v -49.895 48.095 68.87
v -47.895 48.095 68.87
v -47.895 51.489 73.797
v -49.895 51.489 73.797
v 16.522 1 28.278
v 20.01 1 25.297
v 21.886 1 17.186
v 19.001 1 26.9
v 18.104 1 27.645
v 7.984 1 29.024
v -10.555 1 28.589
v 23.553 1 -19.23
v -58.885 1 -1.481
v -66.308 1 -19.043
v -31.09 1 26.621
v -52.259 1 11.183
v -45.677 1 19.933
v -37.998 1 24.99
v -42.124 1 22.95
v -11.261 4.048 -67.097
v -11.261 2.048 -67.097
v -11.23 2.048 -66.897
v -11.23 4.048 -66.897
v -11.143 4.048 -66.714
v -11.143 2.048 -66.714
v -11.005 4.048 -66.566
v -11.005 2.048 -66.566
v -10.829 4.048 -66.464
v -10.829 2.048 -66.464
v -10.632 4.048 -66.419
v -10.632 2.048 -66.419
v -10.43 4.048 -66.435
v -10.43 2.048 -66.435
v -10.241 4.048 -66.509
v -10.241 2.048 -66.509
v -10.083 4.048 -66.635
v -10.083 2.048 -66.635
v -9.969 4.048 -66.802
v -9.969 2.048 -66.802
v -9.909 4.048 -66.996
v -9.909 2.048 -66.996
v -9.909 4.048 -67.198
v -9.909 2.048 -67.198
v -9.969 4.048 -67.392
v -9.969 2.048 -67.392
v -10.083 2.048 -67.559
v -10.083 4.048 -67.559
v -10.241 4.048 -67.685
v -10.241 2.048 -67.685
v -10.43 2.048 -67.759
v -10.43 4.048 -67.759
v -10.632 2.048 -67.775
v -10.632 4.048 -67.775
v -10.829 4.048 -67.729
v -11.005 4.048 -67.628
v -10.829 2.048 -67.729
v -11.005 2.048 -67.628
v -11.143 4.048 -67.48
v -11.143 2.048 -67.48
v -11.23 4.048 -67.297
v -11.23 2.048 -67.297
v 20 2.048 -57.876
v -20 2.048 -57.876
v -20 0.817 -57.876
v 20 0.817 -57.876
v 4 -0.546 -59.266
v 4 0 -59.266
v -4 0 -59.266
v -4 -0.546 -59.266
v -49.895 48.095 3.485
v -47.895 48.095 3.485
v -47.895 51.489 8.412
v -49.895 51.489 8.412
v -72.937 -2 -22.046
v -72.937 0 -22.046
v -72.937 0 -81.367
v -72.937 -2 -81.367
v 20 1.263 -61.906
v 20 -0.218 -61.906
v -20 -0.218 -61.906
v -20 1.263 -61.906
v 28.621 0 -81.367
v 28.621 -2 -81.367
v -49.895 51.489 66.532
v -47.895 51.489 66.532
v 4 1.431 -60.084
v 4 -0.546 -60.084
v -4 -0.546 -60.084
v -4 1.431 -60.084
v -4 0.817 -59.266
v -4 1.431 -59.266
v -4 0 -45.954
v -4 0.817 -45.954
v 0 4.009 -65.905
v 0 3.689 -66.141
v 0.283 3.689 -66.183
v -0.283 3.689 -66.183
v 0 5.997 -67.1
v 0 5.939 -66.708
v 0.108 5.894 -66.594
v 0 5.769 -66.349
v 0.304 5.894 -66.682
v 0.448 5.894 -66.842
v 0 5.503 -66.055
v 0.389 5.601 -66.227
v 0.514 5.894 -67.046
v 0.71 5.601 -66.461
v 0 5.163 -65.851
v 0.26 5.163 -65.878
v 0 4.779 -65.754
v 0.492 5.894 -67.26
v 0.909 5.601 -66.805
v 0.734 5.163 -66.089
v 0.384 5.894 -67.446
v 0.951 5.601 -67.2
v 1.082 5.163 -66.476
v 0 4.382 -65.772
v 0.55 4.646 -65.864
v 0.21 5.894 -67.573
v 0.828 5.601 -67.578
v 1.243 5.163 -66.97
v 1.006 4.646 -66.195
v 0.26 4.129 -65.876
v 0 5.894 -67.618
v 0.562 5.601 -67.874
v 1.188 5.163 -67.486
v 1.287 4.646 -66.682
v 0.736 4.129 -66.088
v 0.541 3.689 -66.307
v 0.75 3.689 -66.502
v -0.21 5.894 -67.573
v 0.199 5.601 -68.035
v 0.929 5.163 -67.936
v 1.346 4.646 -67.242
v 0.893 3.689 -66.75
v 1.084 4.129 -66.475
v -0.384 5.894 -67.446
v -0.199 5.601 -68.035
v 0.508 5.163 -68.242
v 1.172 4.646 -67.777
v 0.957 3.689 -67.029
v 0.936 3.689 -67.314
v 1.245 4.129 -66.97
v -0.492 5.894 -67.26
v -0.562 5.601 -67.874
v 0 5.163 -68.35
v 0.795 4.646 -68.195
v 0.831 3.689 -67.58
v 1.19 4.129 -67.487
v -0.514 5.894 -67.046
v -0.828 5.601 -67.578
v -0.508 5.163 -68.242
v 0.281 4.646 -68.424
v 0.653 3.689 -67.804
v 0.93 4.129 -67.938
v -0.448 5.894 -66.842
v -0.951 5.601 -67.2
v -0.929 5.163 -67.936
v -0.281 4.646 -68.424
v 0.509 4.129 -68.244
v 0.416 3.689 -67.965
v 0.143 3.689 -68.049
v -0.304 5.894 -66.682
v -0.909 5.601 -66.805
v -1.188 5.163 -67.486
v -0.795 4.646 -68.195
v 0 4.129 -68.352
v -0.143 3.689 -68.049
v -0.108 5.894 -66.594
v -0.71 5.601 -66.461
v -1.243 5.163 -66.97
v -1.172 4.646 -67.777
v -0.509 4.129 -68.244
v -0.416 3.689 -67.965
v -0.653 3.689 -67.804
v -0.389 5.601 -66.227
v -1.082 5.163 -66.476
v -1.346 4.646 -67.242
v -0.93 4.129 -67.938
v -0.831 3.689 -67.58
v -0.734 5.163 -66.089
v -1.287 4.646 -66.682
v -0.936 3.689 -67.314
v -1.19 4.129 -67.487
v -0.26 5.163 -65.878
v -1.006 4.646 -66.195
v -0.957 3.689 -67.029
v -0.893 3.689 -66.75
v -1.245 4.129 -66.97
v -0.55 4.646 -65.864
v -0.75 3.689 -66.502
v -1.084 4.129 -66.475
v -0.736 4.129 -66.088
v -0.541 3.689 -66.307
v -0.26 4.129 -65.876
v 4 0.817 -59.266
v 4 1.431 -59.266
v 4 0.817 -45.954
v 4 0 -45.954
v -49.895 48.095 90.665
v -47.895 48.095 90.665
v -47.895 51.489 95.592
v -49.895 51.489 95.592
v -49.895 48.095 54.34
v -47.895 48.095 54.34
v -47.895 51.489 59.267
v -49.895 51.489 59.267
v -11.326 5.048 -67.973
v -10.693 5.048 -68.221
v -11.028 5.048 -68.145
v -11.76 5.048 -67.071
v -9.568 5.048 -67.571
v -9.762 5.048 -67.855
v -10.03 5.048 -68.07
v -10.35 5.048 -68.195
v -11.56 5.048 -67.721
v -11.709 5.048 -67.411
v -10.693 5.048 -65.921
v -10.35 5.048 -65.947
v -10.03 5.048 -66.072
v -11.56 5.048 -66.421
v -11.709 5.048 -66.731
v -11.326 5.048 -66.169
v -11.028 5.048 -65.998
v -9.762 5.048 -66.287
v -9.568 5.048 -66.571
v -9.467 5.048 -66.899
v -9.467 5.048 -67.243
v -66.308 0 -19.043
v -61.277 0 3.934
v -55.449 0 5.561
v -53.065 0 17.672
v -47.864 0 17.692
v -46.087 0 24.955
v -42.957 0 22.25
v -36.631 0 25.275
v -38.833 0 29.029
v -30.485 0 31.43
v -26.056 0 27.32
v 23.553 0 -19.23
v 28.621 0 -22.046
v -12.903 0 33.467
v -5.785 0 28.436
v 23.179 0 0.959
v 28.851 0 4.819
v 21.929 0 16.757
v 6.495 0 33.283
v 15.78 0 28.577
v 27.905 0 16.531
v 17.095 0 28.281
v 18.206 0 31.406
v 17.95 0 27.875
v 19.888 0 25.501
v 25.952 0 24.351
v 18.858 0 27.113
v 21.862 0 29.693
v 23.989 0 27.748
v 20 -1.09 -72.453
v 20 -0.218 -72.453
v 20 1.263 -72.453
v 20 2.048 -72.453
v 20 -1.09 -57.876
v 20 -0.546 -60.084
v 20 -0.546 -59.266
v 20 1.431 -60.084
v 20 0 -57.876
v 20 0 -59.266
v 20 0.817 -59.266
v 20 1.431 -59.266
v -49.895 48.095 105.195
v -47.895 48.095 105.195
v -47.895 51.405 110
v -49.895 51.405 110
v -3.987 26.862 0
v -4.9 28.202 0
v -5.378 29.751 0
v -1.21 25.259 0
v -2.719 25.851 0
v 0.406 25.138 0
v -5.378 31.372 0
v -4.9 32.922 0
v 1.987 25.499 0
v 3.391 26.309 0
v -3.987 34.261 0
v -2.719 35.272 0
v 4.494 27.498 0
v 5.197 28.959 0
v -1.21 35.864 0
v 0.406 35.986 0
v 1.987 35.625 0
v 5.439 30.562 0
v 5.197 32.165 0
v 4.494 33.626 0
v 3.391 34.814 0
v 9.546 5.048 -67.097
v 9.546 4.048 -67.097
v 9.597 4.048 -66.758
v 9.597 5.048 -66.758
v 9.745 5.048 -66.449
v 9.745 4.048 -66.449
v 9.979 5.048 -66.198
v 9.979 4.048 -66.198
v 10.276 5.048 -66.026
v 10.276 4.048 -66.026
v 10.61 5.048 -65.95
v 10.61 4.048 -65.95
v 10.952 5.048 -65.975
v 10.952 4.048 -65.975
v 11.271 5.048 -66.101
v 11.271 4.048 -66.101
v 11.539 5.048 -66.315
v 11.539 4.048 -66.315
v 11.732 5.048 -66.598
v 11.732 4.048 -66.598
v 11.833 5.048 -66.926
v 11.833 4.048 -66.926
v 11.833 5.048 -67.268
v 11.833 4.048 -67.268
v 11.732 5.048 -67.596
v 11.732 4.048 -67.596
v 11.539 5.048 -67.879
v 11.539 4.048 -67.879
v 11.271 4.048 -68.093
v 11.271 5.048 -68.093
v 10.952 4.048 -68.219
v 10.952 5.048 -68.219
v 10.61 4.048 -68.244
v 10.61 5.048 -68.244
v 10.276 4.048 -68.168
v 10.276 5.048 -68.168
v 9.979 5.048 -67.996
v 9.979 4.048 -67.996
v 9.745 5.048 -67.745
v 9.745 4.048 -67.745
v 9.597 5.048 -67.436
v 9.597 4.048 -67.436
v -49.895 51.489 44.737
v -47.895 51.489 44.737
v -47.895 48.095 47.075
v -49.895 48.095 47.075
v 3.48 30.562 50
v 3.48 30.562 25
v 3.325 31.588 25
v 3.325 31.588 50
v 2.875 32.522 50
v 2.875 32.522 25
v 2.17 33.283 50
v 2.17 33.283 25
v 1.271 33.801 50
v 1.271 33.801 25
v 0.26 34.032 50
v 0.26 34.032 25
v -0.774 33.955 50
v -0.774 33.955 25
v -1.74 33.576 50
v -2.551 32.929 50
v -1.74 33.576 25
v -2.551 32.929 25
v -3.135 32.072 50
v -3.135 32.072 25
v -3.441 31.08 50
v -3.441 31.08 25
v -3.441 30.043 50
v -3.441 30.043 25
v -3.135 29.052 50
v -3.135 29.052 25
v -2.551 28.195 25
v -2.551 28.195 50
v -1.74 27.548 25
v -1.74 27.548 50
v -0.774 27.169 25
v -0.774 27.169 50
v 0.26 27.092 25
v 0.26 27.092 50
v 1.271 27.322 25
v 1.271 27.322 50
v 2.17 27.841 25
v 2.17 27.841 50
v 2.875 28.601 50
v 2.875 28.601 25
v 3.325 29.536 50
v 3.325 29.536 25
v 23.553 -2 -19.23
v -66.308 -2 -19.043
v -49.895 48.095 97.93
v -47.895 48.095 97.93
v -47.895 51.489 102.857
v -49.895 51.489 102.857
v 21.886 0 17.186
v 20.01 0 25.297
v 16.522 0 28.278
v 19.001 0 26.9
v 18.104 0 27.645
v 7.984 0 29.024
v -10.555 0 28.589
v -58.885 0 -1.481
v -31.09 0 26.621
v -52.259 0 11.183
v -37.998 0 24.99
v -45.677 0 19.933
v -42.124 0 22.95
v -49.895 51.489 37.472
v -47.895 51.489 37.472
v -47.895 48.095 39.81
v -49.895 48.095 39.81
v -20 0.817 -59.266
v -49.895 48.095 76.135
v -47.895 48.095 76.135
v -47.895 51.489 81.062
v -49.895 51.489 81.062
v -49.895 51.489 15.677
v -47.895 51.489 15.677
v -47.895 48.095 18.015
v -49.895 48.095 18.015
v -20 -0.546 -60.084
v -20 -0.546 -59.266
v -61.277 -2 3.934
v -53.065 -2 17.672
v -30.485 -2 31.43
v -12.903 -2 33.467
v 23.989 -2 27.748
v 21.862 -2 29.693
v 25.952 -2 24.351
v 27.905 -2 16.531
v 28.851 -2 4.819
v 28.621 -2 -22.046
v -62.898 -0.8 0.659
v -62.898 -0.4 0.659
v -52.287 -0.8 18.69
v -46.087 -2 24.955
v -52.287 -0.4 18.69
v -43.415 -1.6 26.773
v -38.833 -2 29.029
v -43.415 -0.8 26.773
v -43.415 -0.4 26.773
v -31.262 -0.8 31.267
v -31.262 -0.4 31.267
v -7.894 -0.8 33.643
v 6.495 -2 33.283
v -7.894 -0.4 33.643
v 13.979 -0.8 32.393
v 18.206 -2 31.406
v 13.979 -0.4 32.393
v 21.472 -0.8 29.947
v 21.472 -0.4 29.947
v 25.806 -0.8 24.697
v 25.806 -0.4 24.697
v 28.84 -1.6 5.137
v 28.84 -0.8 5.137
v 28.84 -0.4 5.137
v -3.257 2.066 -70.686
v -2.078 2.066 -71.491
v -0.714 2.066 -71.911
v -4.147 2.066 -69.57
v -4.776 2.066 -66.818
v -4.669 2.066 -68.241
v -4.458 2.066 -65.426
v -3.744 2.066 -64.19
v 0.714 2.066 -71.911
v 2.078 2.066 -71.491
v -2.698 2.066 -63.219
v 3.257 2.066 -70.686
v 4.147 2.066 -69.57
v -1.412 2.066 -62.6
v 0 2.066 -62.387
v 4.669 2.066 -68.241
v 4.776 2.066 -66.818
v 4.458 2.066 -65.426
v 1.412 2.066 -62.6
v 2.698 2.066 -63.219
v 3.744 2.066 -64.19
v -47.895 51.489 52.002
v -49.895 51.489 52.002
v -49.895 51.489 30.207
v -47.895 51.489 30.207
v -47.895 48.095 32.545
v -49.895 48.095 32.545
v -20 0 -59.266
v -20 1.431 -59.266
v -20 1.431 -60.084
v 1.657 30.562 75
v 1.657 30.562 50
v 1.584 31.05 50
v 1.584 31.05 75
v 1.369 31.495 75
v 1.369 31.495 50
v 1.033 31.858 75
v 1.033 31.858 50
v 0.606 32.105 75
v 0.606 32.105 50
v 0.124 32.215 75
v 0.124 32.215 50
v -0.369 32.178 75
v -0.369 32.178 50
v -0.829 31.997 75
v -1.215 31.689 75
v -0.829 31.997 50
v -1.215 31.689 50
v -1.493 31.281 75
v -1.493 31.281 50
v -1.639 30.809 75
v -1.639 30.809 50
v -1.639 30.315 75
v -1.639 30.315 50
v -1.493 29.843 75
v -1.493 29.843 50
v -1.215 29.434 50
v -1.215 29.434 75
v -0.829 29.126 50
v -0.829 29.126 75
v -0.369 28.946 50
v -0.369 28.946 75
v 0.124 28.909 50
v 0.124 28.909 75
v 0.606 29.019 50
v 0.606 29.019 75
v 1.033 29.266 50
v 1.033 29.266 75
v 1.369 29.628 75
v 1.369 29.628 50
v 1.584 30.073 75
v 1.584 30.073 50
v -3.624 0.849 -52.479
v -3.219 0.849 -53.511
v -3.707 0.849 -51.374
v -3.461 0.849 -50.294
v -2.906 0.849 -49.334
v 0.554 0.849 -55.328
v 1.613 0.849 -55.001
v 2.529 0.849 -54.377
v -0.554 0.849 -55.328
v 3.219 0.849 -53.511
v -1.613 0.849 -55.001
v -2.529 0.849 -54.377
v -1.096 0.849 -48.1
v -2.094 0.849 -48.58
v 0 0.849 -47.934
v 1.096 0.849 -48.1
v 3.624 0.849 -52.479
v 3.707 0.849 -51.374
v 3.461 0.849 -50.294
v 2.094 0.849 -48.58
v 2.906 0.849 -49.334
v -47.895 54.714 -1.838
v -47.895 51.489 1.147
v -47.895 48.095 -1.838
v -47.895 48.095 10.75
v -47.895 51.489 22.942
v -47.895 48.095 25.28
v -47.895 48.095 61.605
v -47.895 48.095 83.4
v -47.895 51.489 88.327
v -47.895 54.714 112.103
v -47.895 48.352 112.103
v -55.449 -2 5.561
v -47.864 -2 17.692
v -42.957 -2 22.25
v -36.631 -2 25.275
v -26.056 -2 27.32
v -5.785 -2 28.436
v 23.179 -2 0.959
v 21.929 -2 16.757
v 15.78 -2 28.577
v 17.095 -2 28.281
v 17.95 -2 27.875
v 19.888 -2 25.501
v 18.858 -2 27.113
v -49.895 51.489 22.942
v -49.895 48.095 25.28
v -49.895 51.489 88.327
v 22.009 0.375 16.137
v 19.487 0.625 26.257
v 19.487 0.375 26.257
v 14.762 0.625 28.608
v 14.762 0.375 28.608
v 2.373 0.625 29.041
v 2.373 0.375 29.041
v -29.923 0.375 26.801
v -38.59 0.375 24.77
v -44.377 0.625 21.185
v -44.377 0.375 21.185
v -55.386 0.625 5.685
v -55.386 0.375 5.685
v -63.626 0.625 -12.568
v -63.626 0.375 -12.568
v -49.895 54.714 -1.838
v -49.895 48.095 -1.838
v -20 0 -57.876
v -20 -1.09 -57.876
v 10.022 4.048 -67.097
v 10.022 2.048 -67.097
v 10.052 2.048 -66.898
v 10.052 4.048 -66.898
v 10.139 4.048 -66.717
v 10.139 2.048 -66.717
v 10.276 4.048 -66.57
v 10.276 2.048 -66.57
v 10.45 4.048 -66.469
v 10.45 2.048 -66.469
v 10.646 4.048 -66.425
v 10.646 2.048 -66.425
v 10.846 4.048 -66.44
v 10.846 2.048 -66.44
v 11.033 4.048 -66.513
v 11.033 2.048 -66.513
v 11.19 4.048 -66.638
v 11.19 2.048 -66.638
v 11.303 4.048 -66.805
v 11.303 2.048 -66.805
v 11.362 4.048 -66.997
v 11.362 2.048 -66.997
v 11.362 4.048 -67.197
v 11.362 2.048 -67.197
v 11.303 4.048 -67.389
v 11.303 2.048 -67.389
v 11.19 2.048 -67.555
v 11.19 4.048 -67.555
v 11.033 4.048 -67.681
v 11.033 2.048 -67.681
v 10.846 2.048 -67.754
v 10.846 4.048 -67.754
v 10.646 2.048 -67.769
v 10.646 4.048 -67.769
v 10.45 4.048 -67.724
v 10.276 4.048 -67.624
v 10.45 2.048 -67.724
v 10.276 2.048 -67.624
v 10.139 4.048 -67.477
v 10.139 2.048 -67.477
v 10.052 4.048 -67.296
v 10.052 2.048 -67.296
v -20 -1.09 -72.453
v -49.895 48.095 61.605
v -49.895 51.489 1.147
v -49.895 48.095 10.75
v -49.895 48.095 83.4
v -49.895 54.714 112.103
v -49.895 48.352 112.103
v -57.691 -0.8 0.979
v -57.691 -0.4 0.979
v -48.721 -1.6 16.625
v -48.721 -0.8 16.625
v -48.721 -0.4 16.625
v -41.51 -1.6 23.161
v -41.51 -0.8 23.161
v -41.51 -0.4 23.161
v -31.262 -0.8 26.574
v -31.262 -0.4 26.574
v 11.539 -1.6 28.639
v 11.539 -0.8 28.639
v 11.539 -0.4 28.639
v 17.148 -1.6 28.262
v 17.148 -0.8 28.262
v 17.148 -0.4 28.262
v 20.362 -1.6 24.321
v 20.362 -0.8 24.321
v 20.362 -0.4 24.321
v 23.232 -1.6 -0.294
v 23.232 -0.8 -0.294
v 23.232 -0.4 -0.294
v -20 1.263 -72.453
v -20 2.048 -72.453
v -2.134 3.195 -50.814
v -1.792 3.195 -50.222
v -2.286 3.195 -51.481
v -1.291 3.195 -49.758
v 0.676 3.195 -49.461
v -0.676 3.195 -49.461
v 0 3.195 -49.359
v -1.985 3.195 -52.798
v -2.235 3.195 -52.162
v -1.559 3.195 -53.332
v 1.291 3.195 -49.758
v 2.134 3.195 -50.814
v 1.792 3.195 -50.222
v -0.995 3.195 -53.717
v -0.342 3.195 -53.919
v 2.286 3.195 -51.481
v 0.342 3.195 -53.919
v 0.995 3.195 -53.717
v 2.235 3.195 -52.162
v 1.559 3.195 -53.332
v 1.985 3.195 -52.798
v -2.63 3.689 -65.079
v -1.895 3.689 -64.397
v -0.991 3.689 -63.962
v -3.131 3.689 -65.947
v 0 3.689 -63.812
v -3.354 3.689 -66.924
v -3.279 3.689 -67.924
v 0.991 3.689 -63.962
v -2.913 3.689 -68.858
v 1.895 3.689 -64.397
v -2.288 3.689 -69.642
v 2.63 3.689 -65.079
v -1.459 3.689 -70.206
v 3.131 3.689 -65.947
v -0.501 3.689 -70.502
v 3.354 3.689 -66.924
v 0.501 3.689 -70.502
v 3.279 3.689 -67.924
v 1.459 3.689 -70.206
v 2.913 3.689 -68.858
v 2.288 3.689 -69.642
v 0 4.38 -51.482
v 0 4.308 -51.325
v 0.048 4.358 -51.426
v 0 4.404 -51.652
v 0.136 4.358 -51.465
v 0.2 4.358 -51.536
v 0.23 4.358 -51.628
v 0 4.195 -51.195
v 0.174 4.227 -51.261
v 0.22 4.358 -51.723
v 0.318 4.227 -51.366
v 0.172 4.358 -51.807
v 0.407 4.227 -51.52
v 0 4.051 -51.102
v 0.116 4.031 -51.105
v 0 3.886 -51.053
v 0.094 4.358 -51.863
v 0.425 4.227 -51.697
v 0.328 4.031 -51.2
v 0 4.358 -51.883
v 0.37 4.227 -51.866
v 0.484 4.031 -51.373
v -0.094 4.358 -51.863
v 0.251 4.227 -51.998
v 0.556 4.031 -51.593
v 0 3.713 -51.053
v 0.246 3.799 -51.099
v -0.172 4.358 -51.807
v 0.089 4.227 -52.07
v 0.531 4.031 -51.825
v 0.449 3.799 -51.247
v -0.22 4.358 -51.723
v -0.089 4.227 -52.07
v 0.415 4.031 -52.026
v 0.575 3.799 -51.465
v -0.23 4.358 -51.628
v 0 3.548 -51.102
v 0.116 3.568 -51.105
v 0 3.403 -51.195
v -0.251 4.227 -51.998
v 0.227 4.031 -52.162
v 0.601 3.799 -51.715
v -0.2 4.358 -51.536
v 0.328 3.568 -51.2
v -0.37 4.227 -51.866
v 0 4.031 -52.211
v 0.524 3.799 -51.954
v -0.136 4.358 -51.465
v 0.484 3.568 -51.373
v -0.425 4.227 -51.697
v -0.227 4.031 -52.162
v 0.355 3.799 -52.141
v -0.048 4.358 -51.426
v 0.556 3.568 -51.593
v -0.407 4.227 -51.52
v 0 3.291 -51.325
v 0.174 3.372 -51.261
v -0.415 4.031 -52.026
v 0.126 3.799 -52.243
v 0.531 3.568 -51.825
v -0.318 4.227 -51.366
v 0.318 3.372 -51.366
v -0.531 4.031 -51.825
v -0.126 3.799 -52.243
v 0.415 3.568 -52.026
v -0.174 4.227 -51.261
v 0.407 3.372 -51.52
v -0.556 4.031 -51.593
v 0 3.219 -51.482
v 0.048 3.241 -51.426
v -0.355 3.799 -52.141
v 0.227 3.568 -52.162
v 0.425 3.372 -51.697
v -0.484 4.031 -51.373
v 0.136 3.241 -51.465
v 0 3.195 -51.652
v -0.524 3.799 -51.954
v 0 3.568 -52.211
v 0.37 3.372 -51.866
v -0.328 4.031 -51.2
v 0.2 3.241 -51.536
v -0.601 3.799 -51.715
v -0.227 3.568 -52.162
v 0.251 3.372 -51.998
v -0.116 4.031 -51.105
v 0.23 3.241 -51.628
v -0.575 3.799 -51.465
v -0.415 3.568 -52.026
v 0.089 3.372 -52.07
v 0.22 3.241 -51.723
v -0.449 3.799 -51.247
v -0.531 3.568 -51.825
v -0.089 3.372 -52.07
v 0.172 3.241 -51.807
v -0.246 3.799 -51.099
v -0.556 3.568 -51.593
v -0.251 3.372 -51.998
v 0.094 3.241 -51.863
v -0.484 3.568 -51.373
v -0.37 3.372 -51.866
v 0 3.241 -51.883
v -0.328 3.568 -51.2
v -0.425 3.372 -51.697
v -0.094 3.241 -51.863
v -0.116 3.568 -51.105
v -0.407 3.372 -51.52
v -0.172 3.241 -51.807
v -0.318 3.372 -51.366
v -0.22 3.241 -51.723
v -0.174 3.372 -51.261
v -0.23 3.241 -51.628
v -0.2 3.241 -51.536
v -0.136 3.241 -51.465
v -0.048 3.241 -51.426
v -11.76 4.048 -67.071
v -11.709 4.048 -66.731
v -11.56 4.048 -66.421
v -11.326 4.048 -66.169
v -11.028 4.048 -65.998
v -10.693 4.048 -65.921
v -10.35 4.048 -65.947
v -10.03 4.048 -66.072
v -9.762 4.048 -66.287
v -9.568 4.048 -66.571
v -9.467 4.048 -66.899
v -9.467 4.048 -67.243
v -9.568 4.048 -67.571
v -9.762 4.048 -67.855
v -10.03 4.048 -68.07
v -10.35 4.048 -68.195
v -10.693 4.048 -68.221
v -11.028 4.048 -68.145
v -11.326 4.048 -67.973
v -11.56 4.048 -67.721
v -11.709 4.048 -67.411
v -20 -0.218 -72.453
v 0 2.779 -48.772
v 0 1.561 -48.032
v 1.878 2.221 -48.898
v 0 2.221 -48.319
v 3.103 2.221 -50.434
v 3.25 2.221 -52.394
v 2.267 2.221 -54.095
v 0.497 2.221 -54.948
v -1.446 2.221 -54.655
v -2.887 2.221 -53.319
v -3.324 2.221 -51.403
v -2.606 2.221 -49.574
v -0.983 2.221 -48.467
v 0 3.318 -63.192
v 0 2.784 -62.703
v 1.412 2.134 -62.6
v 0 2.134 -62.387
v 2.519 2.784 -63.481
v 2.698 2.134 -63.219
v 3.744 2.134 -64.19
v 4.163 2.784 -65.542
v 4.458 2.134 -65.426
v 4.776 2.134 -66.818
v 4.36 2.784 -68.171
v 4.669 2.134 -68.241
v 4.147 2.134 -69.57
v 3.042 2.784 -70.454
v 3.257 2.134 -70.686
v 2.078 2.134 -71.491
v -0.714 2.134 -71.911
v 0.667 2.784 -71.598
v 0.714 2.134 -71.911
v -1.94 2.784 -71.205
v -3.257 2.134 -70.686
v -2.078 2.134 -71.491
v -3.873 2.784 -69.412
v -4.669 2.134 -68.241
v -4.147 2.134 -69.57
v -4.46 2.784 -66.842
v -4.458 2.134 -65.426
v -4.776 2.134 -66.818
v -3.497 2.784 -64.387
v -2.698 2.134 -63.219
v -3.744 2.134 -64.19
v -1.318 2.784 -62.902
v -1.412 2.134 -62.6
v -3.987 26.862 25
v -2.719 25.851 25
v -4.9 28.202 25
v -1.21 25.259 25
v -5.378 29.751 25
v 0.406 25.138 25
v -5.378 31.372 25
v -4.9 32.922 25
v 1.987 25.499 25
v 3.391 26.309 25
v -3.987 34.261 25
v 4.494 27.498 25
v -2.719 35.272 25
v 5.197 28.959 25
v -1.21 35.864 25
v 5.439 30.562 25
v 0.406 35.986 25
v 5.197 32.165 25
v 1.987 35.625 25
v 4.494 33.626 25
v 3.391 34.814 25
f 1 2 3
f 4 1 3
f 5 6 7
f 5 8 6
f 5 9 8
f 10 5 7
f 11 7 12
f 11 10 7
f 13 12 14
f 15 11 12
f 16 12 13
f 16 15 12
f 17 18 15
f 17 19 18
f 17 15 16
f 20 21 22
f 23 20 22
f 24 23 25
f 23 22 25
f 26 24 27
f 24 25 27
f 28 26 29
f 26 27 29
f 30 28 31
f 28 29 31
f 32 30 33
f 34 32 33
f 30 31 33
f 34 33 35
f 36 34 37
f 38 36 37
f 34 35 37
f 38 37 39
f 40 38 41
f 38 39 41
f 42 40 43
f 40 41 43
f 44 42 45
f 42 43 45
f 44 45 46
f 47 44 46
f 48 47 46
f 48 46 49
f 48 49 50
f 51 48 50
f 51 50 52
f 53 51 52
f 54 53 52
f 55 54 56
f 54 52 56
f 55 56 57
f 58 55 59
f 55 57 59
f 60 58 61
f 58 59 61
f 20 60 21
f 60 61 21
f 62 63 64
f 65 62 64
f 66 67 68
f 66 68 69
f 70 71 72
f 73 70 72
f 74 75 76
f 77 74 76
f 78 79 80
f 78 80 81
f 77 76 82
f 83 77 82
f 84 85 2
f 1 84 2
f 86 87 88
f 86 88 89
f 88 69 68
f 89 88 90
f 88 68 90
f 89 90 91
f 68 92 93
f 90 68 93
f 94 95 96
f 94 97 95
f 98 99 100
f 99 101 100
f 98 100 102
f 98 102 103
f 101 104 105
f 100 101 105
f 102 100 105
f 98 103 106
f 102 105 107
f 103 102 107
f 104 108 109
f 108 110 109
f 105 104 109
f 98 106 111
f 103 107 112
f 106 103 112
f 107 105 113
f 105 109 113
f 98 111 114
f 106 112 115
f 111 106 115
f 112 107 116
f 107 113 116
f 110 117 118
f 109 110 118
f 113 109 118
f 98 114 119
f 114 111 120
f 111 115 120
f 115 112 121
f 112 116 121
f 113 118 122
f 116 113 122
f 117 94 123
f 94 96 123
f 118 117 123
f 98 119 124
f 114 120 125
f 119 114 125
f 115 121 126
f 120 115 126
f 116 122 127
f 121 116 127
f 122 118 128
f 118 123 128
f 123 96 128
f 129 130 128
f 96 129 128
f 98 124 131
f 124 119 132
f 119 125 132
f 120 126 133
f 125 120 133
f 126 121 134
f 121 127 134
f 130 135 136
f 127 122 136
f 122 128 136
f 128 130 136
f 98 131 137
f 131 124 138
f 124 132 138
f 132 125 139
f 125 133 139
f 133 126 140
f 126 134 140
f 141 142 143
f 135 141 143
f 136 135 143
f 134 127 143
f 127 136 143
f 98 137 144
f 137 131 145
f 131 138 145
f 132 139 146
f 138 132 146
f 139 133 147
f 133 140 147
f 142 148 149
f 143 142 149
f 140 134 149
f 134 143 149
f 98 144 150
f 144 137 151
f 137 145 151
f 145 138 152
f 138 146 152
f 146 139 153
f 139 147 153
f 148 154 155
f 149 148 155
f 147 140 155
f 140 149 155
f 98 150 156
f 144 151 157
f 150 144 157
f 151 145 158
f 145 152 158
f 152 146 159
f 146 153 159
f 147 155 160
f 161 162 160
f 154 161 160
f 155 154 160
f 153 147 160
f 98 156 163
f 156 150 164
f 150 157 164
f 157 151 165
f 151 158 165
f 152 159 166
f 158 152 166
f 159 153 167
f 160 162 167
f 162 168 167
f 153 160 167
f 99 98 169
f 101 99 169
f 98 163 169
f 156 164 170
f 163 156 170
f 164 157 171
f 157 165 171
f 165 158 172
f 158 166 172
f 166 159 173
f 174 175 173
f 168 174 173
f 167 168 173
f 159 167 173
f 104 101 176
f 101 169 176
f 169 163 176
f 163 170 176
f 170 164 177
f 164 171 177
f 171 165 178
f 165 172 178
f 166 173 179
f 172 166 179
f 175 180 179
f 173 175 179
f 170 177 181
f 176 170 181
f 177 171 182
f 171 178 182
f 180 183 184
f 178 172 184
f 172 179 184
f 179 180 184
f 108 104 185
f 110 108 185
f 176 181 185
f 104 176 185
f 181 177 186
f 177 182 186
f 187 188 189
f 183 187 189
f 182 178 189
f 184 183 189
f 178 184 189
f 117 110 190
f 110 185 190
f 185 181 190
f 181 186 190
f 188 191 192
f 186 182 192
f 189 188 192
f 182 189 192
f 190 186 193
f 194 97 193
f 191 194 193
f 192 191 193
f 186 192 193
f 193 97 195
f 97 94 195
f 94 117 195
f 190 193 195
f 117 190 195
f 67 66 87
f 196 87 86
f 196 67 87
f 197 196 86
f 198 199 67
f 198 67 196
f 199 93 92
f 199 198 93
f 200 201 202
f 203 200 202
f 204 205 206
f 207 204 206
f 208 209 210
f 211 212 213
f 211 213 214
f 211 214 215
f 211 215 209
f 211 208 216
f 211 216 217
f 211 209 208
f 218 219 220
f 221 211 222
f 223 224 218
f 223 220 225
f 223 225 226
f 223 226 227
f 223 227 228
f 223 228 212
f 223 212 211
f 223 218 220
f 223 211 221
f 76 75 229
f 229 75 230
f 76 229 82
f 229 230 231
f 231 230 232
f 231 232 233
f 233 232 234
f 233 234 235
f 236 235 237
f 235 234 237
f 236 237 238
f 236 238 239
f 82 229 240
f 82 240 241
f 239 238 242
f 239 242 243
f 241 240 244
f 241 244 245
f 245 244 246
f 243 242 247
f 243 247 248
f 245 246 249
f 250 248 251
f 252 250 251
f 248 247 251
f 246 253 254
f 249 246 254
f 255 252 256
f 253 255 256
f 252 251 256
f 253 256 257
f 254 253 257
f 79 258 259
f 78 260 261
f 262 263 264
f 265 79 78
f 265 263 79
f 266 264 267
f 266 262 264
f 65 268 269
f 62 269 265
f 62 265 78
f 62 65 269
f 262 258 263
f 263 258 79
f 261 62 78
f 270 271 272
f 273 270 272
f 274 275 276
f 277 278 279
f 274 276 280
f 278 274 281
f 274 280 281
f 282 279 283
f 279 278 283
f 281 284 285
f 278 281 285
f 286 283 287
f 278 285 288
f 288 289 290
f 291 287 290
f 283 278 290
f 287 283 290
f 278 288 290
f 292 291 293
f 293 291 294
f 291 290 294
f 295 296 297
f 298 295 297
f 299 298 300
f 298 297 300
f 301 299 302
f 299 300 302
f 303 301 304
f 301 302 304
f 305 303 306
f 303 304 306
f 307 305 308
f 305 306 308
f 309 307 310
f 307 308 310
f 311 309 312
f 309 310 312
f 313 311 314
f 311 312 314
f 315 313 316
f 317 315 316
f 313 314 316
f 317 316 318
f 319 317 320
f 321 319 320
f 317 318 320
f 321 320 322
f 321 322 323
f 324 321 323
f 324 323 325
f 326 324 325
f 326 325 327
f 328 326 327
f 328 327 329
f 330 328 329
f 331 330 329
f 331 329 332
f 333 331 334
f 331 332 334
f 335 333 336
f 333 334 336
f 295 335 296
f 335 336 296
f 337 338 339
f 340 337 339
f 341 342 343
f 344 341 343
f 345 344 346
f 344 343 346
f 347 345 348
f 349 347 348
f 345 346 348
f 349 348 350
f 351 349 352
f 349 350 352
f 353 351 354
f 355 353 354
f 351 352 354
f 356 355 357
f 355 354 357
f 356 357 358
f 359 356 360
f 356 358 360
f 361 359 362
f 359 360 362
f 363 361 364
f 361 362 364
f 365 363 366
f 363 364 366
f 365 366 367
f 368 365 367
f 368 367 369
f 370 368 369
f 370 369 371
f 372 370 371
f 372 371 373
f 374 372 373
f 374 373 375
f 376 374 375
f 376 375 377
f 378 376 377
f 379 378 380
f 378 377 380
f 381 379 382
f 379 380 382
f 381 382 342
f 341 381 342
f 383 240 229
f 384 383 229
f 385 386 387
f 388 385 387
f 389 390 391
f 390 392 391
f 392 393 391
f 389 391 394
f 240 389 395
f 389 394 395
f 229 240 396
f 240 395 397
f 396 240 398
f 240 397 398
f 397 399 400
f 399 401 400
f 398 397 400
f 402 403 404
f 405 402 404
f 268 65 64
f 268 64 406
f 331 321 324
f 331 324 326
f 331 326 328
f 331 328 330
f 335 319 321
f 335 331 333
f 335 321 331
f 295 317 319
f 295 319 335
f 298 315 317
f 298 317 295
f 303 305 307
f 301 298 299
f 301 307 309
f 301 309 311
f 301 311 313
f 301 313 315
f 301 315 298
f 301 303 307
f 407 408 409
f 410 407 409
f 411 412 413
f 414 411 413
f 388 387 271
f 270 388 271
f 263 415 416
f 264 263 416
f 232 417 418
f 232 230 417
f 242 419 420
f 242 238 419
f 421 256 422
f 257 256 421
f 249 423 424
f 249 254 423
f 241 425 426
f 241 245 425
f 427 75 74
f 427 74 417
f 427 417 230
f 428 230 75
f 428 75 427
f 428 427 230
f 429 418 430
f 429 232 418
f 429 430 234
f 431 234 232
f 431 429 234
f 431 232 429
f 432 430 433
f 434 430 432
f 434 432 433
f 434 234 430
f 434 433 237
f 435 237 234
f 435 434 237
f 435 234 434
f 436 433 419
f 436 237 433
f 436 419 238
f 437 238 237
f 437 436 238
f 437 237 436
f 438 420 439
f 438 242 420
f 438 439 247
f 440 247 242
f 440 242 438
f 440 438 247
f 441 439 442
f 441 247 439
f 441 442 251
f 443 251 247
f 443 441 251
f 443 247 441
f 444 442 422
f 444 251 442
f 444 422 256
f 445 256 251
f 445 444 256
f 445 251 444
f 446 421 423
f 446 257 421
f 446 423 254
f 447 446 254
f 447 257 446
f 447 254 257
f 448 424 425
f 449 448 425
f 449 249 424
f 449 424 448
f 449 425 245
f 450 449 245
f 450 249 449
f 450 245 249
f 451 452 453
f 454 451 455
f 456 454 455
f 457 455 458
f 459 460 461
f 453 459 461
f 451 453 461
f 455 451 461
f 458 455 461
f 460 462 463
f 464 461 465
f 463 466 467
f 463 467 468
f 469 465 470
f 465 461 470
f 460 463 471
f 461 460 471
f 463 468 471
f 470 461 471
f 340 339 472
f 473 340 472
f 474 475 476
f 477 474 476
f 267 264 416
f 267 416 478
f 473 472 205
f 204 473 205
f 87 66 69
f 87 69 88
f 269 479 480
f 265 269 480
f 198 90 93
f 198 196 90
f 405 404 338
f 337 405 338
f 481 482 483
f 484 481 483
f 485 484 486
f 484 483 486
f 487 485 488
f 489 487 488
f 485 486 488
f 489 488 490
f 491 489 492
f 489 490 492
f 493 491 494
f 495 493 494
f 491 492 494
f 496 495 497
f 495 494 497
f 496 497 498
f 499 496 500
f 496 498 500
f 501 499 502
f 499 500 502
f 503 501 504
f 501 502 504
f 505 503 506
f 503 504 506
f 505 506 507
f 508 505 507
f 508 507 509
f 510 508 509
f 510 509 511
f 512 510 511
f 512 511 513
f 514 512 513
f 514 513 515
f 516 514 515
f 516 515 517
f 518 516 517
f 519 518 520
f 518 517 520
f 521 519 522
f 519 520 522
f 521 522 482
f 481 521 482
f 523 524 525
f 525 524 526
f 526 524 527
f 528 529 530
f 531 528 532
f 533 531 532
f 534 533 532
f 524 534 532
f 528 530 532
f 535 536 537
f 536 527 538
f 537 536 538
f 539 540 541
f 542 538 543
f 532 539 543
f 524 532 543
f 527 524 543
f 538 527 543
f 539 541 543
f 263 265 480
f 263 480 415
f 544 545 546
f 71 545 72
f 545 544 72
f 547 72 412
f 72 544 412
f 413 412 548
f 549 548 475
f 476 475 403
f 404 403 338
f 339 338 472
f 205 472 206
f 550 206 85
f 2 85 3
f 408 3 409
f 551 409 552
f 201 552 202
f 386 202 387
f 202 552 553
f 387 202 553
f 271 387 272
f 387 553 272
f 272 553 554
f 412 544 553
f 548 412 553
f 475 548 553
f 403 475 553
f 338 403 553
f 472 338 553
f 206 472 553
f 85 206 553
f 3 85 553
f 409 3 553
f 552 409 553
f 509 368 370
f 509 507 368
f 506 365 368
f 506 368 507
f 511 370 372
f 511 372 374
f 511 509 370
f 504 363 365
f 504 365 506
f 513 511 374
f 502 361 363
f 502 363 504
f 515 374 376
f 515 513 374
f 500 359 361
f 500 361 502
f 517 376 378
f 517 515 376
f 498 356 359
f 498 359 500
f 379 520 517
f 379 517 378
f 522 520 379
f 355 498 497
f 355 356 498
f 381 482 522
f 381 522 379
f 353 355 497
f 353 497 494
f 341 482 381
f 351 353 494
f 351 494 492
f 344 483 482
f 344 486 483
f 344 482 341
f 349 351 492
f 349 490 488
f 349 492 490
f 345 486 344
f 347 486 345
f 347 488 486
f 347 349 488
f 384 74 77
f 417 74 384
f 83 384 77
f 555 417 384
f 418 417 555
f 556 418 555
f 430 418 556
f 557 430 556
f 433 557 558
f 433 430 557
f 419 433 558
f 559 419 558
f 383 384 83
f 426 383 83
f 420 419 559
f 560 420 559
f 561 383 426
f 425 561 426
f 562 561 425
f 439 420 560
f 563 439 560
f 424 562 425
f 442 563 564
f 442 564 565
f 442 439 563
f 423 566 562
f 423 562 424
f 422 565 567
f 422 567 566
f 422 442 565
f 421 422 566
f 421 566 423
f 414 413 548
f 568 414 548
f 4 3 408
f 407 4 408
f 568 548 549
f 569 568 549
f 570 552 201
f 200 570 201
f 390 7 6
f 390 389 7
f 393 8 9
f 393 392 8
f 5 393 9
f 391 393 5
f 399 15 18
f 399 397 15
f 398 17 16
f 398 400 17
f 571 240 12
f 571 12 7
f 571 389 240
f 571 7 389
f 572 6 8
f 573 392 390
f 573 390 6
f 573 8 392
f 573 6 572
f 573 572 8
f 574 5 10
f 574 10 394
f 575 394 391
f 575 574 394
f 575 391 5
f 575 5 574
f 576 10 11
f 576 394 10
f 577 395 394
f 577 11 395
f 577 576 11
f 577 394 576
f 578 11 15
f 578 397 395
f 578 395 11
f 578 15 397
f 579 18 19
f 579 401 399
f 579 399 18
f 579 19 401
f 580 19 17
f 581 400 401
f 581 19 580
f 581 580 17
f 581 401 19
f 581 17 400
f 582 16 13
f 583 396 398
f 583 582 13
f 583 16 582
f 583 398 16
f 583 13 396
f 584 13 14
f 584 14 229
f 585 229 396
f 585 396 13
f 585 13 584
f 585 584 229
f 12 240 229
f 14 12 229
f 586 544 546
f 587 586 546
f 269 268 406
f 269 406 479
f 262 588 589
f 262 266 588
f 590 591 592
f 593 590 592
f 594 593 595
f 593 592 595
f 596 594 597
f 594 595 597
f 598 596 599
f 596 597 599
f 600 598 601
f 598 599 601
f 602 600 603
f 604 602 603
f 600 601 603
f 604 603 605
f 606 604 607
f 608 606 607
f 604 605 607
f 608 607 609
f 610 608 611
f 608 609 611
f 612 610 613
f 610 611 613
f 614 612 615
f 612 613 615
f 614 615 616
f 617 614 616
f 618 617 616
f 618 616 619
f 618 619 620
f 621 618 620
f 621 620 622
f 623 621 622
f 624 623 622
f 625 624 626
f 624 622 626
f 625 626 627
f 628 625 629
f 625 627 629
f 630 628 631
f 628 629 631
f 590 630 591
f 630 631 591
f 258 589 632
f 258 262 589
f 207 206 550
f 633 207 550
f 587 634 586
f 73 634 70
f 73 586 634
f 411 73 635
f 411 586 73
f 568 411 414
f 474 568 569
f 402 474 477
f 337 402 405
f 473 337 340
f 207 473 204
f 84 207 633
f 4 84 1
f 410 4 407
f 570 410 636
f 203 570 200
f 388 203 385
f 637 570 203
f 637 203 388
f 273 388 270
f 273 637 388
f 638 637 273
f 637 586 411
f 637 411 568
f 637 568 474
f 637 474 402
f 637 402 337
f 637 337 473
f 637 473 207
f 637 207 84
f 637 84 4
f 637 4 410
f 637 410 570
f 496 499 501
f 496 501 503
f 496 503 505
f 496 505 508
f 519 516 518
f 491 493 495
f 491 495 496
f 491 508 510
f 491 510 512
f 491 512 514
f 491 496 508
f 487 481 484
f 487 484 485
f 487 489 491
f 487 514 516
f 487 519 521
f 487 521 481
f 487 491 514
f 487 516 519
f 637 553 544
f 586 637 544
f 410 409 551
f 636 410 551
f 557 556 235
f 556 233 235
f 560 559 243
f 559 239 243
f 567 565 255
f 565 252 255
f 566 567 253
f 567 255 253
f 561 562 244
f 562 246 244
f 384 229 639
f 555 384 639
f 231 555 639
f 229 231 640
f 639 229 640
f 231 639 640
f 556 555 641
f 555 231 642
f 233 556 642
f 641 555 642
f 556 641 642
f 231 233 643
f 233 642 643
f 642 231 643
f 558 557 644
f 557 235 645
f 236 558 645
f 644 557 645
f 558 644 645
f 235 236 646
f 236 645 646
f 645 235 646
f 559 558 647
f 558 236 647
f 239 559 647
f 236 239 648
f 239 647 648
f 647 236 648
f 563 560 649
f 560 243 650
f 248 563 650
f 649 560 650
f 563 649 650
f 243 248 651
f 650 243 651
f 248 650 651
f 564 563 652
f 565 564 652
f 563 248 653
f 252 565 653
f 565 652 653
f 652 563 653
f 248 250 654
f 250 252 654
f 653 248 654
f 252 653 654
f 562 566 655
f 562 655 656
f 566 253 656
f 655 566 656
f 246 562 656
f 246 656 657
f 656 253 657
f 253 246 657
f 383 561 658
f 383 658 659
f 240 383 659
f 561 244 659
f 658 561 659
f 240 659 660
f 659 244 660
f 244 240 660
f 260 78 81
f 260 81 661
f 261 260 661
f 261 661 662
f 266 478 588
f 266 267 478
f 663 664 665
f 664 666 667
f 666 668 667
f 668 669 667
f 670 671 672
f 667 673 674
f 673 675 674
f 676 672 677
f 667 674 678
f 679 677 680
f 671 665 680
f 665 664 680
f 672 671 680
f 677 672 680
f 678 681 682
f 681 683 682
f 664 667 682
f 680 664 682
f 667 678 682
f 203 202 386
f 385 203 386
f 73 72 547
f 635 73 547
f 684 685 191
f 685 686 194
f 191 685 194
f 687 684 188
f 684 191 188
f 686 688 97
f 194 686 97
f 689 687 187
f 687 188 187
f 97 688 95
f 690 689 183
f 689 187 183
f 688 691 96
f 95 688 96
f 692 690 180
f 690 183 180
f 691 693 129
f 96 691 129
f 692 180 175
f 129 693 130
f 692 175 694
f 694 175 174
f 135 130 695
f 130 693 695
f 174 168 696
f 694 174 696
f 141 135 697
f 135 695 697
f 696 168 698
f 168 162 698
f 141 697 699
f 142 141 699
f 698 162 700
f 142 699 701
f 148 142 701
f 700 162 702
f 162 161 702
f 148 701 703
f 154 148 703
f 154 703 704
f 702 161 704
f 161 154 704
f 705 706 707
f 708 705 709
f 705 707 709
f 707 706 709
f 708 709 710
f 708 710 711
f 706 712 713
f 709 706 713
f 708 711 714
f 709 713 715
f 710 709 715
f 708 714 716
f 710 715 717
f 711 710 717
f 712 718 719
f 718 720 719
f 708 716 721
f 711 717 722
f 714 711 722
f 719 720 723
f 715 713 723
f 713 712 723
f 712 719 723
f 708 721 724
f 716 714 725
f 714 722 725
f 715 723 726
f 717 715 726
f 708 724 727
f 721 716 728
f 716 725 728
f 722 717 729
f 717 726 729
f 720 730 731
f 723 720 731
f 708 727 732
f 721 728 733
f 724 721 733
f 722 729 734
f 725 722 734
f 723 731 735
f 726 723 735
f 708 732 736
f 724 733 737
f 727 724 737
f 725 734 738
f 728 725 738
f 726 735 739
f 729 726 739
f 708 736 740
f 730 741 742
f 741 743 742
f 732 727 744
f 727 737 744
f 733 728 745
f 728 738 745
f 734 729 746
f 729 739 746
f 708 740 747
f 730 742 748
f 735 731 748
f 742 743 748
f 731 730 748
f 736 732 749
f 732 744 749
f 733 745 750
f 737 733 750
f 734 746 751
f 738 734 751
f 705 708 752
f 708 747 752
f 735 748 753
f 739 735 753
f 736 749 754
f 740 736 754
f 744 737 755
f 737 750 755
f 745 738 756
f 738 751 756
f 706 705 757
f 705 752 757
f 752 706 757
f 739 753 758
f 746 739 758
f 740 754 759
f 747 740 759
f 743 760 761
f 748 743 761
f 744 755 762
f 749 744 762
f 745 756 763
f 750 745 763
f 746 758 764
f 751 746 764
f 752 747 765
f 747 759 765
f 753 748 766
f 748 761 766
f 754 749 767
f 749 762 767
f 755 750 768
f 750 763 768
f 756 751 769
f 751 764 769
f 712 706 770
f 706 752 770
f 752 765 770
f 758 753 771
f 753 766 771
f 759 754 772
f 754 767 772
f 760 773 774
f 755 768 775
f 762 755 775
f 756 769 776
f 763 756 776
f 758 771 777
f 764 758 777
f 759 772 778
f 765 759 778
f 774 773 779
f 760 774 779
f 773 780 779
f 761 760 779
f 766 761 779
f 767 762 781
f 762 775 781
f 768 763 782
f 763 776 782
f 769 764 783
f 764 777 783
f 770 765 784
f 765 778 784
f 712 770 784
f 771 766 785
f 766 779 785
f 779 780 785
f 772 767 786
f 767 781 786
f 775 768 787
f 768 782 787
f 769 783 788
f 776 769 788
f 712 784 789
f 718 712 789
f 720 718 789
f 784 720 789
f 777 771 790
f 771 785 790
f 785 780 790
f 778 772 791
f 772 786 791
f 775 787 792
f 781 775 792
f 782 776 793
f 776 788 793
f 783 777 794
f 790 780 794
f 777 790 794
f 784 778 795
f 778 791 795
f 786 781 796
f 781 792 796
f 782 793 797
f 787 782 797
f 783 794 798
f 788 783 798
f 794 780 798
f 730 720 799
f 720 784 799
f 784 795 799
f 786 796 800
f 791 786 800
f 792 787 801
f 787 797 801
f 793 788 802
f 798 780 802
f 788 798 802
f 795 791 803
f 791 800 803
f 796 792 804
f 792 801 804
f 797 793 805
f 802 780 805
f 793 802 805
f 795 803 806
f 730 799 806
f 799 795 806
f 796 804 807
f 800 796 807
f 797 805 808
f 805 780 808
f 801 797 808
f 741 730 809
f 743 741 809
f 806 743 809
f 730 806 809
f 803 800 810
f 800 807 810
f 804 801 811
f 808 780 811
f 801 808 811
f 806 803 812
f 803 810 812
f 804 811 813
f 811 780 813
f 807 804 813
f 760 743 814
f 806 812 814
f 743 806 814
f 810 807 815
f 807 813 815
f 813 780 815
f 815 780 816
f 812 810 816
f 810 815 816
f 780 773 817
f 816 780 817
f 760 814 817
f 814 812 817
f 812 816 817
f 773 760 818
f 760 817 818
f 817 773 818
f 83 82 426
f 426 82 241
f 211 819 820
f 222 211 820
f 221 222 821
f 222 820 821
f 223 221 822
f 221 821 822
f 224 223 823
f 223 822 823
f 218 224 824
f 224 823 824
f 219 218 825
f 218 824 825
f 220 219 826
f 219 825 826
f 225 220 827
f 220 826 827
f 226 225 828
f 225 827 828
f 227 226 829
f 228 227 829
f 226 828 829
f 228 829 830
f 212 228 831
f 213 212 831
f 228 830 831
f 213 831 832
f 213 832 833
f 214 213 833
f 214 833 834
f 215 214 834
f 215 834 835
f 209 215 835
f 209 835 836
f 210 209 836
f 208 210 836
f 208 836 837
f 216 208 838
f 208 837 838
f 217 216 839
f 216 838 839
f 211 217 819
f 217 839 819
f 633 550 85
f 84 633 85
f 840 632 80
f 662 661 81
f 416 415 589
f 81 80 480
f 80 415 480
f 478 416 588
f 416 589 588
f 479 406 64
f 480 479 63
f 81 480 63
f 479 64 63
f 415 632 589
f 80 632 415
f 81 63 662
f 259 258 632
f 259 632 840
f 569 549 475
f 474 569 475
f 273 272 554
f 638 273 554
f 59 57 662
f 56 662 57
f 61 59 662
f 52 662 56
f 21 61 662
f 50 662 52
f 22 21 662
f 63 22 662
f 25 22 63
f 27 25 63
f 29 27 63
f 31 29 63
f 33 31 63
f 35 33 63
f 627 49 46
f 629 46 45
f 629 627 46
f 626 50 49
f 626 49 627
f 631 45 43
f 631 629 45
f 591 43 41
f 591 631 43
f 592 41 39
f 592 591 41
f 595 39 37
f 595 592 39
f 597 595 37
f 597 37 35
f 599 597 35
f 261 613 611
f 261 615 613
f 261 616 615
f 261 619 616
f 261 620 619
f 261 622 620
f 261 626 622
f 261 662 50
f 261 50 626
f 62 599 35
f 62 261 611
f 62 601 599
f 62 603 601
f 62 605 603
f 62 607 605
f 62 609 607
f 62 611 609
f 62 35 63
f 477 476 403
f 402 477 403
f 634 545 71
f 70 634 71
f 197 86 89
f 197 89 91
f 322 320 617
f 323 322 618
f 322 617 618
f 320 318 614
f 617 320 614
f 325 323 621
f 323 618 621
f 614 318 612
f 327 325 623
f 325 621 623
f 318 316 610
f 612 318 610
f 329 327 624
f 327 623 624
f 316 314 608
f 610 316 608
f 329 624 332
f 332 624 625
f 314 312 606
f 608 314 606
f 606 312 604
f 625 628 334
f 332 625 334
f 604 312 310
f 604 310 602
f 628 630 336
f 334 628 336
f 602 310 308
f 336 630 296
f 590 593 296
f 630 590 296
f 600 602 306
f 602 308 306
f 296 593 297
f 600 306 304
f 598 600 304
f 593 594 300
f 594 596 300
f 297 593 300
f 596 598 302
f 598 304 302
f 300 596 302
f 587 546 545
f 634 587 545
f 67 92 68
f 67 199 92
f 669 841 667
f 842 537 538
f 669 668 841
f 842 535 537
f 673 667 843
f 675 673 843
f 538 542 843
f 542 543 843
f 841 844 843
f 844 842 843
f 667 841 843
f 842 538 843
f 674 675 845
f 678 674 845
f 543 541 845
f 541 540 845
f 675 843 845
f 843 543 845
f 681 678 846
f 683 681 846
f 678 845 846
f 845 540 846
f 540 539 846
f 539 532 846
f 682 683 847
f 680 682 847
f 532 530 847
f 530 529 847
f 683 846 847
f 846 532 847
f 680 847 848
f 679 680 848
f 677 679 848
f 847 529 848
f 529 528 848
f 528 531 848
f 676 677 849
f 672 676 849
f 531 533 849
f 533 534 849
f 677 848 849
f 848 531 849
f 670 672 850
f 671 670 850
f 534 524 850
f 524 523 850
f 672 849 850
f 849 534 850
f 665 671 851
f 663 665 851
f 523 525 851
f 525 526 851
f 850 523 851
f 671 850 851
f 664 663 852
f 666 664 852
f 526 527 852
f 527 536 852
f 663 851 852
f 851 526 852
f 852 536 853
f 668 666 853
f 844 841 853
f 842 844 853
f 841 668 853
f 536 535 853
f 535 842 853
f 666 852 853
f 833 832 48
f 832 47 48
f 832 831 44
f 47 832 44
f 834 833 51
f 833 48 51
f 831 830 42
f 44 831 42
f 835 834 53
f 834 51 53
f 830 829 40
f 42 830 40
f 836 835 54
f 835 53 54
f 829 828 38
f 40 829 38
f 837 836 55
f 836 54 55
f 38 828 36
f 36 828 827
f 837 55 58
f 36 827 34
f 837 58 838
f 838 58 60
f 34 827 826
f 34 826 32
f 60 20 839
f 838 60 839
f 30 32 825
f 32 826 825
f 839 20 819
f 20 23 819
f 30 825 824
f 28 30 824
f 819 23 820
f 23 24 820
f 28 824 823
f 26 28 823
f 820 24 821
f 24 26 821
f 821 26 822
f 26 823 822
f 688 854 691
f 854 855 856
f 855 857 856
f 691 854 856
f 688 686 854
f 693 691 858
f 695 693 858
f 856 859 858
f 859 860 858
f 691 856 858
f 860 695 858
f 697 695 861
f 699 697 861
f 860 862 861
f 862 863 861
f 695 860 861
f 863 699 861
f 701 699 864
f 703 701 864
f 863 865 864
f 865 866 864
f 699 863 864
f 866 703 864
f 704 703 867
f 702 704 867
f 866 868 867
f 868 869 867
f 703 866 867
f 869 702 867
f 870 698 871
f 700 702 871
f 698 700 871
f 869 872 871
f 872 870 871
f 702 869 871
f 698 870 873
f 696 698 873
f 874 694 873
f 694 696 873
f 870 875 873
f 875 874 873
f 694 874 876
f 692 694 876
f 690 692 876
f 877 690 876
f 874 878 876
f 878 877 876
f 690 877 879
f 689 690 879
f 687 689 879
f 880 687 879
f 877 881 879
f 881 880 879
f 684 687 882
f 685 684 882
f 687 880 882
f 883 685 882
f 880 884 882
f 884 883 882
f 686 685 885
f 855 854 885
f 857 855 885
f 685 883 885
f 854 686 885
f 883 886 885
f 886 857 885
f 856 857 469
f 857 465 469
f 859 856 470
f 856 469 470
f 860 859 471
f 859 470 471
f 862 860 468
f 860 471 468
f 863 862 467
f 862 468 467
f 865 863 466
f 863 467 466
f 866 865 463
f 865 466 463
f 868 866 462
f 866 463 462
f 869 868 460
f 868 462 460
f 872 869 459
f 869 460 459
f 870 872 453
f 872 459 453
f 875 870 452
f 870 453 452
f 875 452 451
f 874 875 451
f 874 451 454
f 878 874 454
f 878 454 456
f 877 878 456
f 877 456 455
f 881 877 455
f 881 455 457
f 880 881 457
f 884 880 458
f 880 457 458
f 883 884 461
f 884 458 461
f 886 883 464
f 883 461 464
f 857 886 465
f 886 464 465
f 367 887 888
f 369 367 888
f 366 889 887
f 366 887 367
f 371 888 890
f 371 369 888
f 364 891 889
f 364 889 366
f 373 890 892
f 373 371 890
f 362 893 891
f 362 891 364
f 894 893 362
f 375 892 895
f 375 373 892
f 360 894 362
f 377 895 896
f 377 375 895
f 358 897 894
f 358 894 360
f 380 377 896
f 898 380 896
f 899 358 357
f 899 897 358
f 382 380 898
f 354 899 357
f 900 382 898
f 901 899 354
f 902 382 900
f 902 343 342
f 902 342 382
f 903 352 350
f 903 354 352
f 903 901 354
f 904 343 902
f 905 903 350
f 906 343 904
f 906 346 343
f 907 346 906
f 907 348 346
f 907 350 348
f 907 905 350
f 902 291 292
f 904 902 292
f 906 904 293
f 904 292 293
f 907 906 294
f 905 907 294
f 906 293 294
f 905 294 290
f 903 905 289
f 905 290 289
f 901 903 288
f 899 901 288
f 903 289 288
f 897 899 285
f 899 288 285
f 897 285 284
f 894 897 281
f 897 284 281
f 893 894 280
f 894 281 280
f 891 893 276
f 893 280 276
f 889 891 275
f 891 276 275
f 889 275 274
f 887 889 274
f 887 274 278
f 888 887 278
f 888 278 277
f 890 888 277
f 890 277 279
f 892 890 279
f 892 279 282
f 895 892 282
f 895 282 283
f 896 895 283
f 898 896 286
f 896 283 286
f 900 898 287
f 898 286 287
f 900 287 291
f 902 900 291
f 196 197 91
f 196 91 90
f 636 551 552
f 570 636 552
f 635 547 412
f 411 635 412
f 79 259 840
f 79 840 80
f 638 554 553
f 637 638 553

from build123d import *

# Parameters (mm, degrees)
F1_DEPTH  = 2
F3_DEPTH  = 1
F5_DEPTH  = 20
F6_R      = 0.6740837688
F6_R_2    = 0.6794872763
F7_DEPTH  = 2
F8_R      = 1.1503813394
F8_R_2    = 1.1532026448
F9_DEPTH  = 1
F14_W     = 3.547757864
F14_H     = 3.547757864
F15_DEPTH = 110
F16_DEPTH = 4
F17_R     = 5.4389816306
F18_DEPTH = 25
F19_R     = 3.4800068769
F20_DEPTH = 25
F21_R     = 1.6574043711
F22_DEPTH = 25
F25_DEPTH = 25
F27_DEPTH = 2


# Not quite as in the source:
# - a feature names something its author has since deleted; it is built from what else it names


with BuildPart() as f1:
    # F0 (on Front) → F1 (new body)
    with BuildSketch(Plane.XZ):
        with BuildLine():
            Line((-72.9369357123, -81.3669546917), (28.6214776443, -81.3669546917))
            Line((28.6214776443, -81.3669546917), (28.6214776443, -22.0463353619))
            add(Edge.make_bspline(
                [(-72.9369357123, -22.0463353619), (-66.3079296953, -6.3903379982), (-54.8236810491, 20.7324864598), (-33.1368908634, 33.9886563081), (14.1885215953, 34.4693387216), (29.9138992328, 26.3054952003), (29.1285218253, -3.0768949366), (28.6214776443, -22.0463353619)],
                knots=[0, 0, 0, 0, 0.2327586614, 0.4032366747, 0.6349341911, 0.7643114096, 1, 1, 1, 1], degree=3))
            Line((-72.9369357123, -22.0463353619), (-72.9369357123, -81.3669546917))
        make_face()
        with BuildLine():
            Line((23.5529407965, -19.2304815576), (-66.3079296953, -19.0427604541))
            add(Edge.make_bspline(
                [(-66.3079296953, -19.0427604541), (-60.6025988038, -5.2091205775), (-50.8417035049, 18.4579923395), (-32.9418385651, 29.0509048337), (11.2998233245, 28.2534036027), (23.8422582571, 29.4620440208), (23.5609324216, -16.9963213799), (23.5529407965, -19.2304815576)],
                knots=[0, 0, 0, 0, 0.2292277789, 0.3921715308, 0.6301185848, 0.7440435368, 0.9842506716, 0.9842506716, 0.9842506716, 0.9842506716], degree=3))
        make_face(mode=Mode.SUBTRACT)
    extrude(amount=F1_DEPTH)


with BuildPart() as f3:
    # F2 (on face) → F3 (new body)
    with BuildSketch(Plane(origin=(0, 0, 0), x_dir=(-1, 0, 0), z_dir=(0, 1, 0))):
        with BuildLine():
            Line((-23.5529407964, -19.2304815668), (66.3079296953, -19.0427604541))
            add(Edge.make_bspline(
                [(-23.5529407964, -19.2304815668), (-23.269595086, -5.9334404727), (-22.8404862365, 14.5885042855), (-20.184558271, 26.8697861091), (-13.9924322403, 30.0265202781), (31.2151711749, 28.02875343), (44.8400626895, 22.8259909303), (55.9527219343, 6.1579662544), (63.45297845, -12.1512318258), (65.5205113196, -17.1808483014), (66.3079296953, -19.0427604541)],
                knots=[0, 0, 0, 0, 0.1767993283, 0.2727640909, 0.3442462663, 0.5417821056, 0.6587934226, 0.788359659, 0.9213359844, 1, 1, 1, 1], degree=3))
        make_face()
    extrude(amount=F3_DEPTH)


with BuildPart() as f5:
    # F4 (on Right) → F5 (new body, symmetric)
    with BuildSketch(Plane.YZ):
        Polygon((-1.0896978201, -57.8757636249), (-1.0896978201, -72.45323807), (-0.2179905568, -72.45323807), (-0.2179905568, -61.9055777788), (1.2627355754, -61.9055777788), (1.2627355754, -72.45323807), (2.0484484266, -72.45323807), (2.0484484266, -57.8757636249), (0.8171472582, -57.8757636249), (0.8171472582, -59.2663548887), (1.4305444201, -59.2663548887), (1.4305444201, -60.084220022), (-0.5459576496, -60.084220022), (-0.5459576496, -59.2663548887), (0, -59.2663548887), (0, -57.8757636249), align=None)
    extrude(amount=F5_DEPTH, both=True)

    # F6 (on face) → F7 (join)
    with BuildSketch(Plane(origin=(0, 2.0484484266, 0), x_dir=(-1, 0, 0), z_dir=(0, 1, 0))):
        with Locations((-10.6959426776, -67.096978426)):
            Circle(F6_R)
        with Locations((10.5811031535, -67.096978426)):
            Circle(F6_R_2)
    extrude(amount=F7_DEPTH)

    # F8 (on face) → F9 (join)
    with BuildSketch(Plane(origin=(0, 4.0484484266, 0), x_dir=(-1, 0, 0), z_dir=(0, 1, 0))):
        with Locations((-10.6959426776, -67.096978426)):
            Circle(F8_R)
        with Locations((10.6070199981, -67.0710653067)):
            Circle(F8_R_2)
    extrude(amount=F9_DEPTH)


with BuildPart() as f11:
    # F10 (on Right) → F11 (revolve)
    with BuildSketch(Plane.YZ):
        with BuildLine():
            Line((2.1344509079, -62.3869039118), (2.0657987334, -62.3869039118))
            Line((2.0657987334, -62.3869039118), (2.0657987334, -67.175835371))
            Line((2.0657987334, -67.175835371), (3.6893903743, -67.175835371))
            Line((3.6893903743, -67.175835371), (3.6893903743, -63.812112902))
            ThreePointArc((3.6893903743, -63.812112902), (3.0686592581, -62.9285025663), (2.1344509079, -62.3869039118))
        make_face()
    revolve(axis=Axis((0, 4.3976157904, -67.175835371), (0, 1, 0)))

    # F12 (on Right) → F13 (revolve)
    with BuildSketch(Plane.YZ):
        with BuildLine():
            Line((3.290206524, -67.100353539), (5.9968891046, -67.100353539))
            ThreePointArc((5.9968891046, -67.100353539), (4.6435478143, -65.7470122487), (3.290206524, -67.100353539))
        make_face()
    revolve(axis=Axis((0, 4.8515796661, -67.100353539), (0, 1, 0)))


with BuildPart() as f15:
    # F14 (on Top) → F15 (new body)
    with BuildSketch(Plane.XY):
        with Locations((-46.1208410561, 48.1243357062)):
            Rectangle(F14_W, F14_H)
    extrude(amount=F15_DEPTH)

    # F14 (on Top) → F25 (join)
    with BuildSketch(Plane.XY):
        with Locations((-46.1208410561, 48.1243357062)):
            Rectangle(F14_W, F14_H)
    extrude(amount=F25_DEPTH)


with BuildPart() as f16:
    # F4 (on Right) → F16 (new body, symmetric)
    with BuildSketch(Plane.YZ):
        Polygon((0, -45.9536090493), (0, -57.8757636249), (0, -59.2663548887), (-0.5459576496, -59.2663548887), (-0.5459576496, -60.084220022), (1.4305444201, -60.084220022), (1.4305444201, -59.2663548887), (0.8171472582, -59.2663548887), (0.8171472582, -57.8757636249), (0.8171472582, -45.9536090493), align=None)
    extrude(amount=F16_DEPTH, both=True)


with BuildPart() as f18:
    # F17 (on Top) → F18 (new body)
    with BuildSketch(Plane.XY):
        with Locations((0, 30.5617935956)):
            Circle(F17_R)
    extrude(amount=F18_DEPTH)

    # F19 (on face) → F20 (join)
    with BuildSketch(Plane.XY.offset(25)):
        with Locations((0, 30.5617935956)):
            Circle(F19_R)
    extrude(amount=F20_DEPTH)

    # F21 (on face) → F22 (join)
    with BuildSketch(Plane.XY.offset(50)):
        with Locations((0, 30.5617935956)):
            Circle(F21_R)
    extrude(amount=F22_DEPTH)


with BuildPart() as f24:
    # F23 (on Right) → F24 (revolve)
    with BuildSketch(Plane.YZ):
        with BuildLine():
            ThreePointArc((4.4042146765, -51.6518875957), (3.7994878367, -51.0471607558), (3.1947609968, -51.6518875957))
            Line((3.1947609968, -51.6518875957), (4.4042146765, -51.6518875957))
        make_face()
    revolve(axis=Axis((0, 2.626526315, -51.6518875957), (0, 1, 0)))


with BuildPart() as f24b:
    # F23 (on Right) → F24, piece 2 (revolve)
    with BuildSketch(Plane.YZ):
        with BuildLine():
            ThreePointArc((3.1947609968, -49.3592881282), (2.2212167521, -48.3185221094), (0.8488379535, -47.9343883626))
            Line((0.8488379535, -47.9343883626), (0.8488379535, -51.6518875957))
            Line((0.8488379535, -51.6518875957), (3.1947609968, -51.6518875957))
            Line((3.1947609968, -51.6518875957), (3.1947609968, -49.3592881282))
        make_face()
    revolve(axis=Axis((0, 2.626526315, -51.6518875957), (0, 1, 0)))


with BuildPart() as f27:
    # F26 (on face) → F27 (new body)
    with BuildSketch(Plane(origin=(-47.8947199881, 0, 0), x_dir=(0, -1, 0), z_dir=(-1, 0, 0))):
        Polygon((-51.4049215033, 110), (-48.3524078404, 112.1028363705), (-54.7136217356, 112.1028363705), (-54.7136217356, -1.8382943235), (-48.0950288475, -1.8382943235), (-51.4891035855, 1.1467365548), (-48.0950288475, 3.4848698415), (-51.4891035855, 8.4117674623), (-48.0950288475, 10.749900749), (-51.4891035855, 15.6767983698), (-48.0950288475, 18.0149316565), (-51.4891035855, 22.9418292773), (-48.0950288475, 25.279962564), (-51.4891035855, 30.2068601848), (-48.0950288475, 32.5449934715), (-51.4891035855, 37.4718910923), (-48.0950288475, 39.810024379), (-51.4891035855, 44.7369219998), (-48.0950288475, 47.0750552865), (-51.4891035855, 52.0019529073), (-48.0950288475, 54.3400861939), (-51.4891035855, 59.2669838148), (-48.0950288475, 61.6051171014), (-51.4891035855, 66.5320147222), (-48.0950288475, 68.8701480089), (-51.4891035855, 73.7970456297), (-48.0950288475, 76.1351789164), (-51.4891035855, 81.0620765372), (-48.0950288475, 83.4002098239), (-51.4891035855, 88.3271074447), (-48.0950288475, 90.6652407314), (-51.4891035855, 95.5921383522), (-48.0950288475, 97.9302716389), (-51.4891035855, 102.8571692597), (-48.0950288475, 105.1953025464), align=None)
    extrude(amount=F27_DEPTH)


solid = Compound([f1.part, f3.part, f5.part, f11.part, f16.part, f18.part, f24.part, f24b.part, f27.part])
